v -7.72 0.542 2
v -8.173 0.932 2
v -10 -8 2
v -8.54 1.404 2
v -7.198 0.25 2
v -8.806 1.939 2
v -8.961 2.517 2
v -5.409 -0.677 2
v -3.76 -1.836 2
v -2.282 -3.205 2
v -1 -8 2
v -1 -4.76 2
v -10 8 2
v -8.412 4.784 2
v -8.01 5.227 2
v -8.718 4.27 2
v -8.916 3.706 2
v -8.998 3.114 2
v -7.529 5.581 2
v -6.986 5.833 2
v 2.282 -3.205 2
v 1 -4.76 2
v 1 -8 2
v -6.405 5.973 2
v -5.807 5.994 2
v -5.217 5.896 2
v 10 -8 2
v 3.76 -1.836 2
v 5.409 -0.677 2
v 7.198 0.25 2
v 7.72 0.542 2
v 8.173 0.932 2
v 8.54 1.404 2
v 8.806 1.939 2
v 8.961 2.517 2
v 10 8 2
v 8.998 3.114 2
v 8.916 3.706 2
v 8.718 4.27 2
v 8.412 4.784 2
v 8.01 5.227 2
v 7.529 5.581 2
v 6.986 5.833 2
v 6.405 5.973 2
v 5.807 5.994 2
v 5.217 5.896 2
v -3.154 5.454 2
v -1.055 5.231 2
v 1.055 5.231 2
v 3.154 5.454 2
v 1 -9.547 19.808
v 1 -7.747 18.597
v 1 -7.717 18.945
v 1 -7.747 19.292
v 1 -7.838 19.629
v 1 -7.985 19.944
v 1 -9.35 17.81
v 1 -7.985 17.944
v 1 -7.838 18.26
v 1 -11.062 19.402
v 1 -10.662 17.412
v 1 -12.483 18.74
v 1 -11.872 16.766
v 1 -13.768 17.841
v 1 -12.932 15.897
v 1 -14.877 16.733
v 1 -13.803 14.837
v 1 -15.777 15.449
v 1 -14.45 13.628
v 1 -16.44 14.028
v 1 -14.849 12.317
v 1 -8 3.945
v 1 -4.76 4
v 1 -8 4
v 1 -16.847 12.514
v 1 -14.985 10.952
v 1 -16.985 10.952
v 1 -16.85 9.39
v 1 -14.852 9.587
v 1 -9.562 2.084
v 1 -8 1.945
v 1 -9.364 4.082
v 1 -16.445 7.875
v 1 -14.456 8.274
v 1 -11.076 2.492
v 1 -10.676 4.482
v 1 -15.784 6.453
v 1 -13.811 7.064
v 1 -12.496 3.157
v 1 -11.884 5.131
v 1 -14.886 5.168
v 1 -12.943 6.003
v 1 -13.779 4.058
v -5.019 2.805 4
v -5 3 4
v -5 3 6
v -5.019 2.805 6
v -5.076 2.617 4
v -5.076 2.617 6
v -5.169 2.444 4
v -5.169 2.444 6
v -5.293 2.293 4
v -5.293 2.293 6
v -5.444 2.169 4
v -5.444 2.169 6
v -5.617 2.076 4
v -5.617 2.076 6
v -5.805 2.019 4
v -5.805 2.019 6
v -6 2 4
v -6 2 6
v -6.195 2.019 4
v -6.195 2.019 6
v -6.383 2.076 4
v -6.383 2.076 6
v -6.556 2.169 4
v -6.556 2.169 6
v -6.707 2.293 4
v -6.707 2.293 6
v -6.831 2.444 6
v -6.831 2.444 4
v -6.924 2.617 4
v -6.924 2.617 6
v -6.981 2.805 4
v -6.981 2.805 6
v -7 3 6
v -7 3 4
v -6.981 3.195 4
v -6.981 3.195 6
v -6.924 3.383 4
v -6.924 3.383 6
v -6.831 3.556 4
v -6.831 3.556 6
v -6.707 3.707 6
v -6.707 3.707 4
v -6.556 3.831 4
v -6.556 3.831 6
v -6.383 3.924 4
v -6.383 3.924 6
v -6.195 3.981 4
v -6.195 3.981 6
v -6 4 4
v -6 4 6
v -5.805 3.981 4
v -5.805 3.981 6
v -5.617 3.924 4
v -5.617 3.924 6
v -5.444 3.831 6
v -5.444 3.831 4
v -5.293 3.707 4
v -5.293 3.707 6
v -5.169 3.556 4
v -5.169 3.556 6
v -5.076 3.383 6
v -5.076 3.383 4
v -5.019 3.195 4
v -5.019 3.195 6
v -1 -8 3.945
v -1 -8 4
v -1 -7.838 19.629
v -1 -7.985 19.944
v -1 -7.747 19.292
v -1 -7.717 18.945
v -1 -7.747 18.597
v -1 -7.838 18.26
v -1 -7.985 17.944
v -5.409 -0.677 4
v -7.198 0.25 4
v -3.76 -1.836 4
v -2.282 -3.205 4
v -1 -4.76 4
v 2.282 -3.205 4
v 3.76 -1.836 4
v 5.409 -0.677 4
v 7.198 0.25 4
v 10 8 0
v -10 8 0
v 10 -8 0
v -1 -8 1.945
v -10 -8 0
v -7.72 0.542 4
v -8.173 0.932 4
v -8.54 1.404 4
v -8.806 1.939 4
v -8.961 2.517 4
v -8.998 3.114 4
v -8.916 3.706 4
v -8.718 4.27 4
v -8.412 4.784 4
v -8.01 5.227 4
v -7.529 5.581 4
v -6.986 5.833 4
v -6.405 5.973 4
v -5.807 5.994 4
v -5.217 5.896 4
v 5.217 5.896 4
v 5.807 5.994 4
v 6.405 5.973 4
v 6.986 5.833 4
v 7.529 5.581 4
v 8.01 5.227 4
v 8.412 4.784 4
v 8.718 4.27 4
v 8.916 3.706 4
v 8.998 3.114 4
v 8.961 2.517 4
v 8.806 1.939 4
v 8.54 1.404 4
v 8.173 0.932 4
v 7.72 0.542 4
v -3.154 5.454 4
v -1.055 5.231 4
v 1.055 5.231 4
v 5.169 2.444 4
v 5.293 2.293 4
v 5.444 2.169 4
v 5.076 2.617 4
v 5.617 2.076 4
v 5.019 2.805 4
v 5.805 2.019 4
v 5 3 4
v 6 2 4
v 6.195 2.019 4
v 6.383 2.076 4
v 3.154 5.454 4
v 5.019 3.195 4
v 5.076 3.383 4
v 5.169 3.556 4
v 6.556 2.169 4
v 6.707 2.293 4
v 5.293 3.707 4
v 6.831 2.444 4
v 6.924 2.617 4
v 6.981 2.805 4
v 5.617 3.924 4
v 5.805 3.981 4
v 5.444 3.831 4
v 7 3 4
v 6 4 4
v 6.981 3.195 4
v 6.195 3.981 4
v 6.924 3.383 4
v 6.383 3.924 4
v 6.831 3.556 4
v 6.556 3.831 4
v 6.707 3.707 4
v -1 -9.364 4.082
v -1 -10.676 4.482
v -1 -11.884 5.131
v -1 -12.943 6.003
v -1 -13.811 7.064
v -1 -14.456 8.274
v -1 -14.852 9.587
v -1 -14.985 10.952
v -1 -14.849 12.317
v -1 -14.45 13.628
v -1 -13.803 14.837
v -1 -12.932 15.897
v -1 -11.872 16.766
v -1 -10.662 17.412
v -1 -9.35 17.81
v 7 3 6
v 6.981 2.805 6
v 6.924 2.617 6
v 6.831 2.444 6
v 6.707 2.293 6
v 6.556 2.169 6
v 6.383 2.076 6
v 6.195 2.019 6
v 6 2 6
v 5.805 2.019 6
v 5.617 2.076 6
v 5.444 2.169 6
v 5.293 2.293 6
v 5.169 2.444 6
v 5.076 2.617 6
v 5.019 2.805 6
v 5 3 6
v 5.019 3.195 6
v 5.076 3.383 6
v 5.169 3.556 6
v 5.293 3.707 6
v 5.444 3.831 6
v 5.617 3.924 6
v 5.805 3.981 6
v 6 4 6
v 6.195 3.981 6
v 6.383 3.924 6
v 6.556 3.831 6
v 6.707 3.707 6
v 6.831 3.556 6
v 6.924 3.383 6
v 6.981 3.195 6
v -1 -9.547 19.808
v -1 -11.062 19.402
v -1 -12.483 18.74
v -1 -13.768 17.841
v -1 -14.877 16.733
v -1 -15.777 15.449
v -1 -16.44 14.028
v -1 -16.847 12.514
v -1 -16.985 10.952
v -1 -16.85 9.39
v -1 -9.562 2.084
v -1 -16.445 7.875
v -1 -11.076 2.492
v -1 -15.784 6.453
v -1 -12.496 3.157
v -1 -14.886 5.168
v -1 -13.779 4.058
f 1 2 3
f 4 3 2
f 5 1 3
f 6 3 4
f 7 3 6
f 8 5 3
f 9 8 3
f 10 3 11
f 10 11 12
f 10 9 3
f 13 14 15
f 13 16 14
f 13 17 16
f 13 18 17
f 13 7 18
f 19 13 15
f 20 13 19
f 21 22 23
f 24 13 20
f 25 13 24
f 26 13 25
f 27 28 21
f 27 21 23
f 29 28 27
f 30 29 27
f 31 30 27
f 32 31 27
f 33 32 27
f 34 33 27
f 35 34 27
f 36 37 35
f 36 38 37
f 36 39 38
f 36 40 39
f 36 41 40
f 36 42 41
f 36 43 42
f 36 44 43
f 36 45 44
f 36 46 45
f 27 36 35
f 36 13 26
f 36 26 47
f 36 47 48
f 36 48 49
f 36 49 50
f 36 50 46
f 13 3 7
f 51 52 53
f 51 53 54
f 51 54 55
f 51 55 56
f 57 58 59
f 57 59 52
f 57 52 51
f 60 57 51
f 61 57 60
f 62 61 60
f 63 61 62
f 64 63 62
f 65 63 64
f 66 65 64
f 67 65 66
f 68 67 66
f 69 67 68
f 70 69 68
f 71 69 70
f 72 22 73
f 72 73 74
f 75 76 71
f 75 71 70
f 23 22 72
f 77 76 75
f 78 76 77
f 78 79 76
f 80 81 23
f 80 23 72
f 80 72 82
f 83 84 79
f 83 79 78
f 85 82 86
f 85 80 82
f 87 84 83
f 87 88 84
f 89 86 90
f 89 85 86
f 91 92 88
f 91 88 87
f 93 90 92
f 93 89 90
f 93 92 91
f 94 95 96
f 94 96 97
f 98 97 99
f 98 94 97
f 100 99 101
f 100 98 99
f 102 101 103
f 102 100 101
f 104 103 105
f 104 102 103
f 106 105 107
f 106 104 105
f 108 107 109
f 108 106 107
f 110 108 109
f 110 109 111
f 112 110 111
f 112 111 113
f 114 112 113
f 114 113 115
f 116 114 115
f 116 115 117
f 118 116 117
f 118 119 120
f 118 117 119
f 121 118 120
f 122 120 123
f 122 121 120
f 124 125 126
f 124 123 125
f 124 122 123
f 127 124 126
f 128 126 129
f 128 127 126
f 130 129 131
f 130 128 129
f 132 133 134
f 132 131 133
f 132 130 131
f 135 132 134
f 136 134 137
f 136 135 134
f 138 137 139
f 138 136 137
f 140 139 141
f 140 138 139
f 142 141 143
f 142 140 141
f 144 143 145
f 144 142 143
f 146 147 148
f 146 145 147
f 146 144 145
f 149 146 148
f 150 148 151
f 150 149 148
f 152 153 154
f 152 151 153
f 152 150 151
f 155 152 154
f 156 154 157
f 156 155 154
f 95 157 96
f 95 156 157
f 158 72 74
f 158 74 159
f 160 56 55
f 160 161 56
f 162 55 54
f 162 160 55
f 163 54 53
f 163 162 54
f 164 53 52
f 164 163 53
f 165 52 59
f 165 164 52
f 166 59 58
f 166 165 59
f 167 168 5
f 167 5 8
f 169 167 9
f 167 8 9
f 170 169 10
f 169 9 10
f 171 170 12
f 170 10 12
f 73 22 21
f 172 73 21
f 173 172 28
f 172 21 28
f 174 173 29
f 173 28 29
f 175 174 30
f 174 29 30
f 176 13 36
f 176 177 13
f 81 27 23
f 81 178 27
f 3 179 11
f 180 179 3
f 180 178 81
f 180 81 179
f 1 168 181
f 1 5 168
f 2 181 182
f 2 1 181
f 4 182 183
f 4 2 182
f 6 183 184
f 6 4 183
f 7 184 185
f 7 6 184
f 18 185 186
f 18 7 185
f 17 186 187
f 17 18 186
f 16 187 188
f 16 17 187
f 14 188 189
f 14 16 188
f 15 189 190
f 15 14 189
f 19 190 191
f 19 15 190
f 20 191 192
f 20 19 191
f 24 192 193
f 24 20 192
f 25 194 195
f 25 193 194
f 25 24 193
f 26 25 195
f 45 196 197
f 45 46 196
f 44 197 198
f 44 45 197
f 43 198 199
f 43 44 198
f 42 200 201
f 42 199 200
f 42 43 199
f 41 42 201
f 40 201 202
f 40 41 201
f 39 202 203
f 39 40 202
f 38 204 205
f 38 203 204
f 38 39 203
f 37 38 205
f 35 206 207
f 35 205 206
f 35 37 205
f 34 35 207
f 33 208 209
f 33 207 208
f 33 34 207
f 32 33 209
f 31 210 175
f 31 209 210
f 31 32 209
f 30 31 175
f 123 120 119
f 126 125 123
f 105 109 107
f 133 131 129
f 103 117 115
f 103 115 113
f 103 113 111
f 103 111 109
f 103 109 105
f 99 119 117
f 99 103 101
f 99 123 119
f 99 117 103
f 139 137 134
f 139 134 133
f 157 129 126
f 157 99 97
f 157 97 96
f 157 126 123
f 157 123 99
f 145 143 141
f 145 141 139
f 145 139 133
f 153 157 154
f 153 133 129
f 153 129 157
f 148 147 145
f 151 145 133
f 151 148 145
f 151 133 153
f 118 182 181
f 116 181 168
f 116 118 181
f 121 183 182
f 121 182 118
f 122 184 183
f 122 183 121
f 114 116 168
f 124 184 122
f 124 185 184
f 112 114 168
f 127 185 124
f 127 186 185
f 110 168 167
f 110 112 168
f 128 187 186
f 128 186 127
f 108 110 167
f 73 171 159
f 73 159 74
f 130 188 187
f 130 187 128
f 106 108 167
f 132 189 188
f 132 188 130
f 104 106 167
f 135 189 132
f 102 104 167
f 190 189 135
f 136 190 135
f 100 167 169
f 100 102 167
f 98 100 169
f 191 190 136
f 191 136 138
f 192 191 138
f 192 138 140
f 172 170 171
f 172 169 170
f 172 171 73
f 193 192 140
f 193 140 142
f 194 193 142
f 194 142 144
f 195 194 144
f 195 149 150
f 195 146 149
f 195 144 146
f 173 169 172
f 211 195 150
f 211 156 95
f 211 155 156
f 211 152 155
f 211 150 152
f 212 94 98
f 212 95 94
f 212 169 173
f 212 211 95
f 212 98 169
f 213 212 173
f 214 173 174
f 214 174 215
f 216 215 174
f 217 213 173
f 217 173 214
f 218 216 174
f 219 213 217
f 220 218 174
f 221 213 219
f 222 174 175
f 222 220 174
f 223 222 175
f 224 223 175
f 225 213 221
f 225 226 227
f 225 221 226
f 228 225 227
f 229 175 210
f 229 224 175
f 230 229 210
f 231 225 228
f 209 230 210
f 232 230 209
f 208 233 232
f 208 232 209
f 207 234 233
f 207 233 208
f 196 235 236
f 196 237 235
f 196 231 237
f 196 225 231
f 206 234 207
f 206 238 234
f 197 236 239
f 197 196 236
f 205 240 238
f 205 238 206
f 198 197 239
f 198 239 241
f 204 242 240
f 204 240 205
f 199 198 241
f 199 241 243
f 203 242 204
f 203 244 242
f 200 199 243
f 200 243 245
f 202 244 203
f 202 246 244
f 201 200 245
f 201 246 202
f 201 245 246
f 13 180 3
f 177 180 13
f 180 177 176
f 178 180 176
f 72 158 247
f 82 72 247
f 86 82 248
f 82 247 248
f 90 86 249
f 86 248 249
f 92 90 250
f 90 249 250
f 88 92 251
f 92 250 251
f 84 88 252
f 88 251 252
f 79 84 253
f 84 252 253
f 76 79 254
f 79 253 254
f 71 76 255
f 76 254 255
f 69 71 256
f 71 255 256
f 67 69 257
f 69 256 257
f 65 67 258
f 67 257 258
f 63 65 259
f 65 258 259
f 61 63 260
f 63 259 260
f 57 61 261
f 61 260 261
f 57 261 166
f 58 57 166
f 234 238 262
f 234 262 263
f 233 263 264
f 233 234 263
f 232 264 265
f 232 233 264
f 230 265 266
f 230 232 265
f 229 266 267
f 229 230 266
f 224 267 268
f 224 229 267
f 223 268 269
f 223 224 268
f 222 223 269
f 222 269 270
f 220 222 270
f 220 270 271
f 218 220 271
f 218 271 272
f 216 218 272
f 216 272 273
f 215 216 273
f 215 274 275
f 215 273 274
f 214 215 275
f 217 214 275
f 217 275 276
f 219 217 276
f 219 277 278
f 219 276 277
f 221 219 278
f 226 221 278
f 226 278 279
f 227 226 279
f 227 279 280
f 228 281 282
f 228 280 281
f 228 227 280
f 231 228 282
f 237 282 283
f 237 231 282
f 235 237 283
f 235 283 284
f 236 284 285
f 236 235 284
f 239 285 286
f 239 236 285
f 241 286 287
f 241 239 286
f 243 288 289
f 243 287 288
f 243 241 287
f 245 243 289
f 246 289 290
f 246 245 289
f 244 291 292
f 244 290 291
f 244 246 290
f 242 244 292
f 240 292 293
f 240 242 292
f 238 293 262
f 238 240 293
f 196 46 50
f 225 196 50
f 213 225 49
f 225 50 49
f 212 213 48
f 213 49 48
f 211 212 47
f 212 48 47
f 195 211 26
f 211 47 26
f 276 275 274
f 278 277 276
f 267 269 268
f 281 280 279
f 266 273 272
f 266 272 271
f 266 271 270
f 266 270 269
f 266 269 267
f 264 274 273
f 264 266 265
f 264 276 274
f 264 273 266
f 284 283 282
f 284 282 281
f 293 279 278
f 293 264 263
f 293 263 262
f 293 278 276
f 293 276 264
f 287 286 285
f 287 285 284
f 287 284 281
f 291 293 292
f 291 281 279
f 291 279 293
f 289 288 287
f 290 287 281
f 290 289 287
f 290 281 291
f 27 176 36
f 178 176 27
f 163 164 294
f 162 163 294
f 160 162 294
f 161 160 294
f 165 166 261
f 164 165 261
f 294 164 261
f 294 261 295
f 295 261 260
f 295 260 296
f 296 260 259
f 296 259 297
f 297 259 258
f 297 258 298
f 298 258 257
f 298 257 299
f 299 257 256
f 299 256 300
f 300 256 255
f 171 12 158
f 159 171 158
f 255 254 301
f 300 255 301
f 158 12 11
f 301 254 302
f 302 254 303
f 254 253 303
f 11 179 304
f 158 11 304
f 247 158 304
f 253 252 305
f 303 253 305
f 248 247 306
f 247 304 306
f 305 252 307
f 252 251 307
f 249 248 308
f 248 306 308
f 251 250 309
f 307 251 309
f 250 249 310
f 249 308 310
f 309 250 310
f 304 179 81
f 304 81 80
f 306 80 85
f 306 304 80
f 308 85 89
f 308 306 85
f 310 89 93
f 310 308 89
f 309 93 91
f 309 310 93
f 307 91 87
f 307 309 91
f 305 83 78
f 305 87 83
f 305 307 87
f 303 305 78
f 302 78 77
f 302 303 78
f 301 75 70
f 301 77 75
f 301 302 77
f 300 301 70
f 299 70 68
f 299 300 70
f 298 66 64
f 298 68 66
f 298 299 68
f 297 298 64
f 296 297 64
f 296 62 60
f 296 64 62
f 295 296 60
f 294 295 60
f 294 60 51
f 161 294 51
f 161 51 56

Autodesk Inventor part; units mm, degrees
ref_plane "YZ Plane" through (0, 0, 0) normal (1, 0, 0) x (0, 1, 0)
ref_plane "XZ Plane" through (0, 0, 0) normal (0, 1, 0) x (-1, 0, 0)
ref_plane "XY Plane" through (0, 0, 0) normal (0, 0, 1) x (1, 0, 0)
sketch "Sketch1" plane through (0, 0, 0) normal (0, 0, 1) x (1, 0, 0)
  line L0 (-10, 8) -> (10, 8)
  line L1 (10, 8) -> (10, -8)
  line L2 (10, -8) -> (-10, -8)
  line L3 (-10, -8) -> (-10, 8)
  line L4 (-10, 8) -> (10, -8) construction
  line L5 (10, 8) -> (-10, -8) construction
  point P0 (0, 0)
  dimension "d0" = 20
  dimension "d1" = 16
extrude "Extrusion1" add sketch "Sketch1" along normal blind 2
sketch "Sketch2" plane through (0, 0, 2) normal (0, 0, 1) x (1, 0, 0)
  line L0 (10, 8) -> (-10, 8) projected
  line L1 (0, -0.2535) -> (0, 8)
  line L2 (0, 0) -> (0, -7.9613)
  line L3 (-10, -8) -> (10, -8) projected
  arc A0 (-5.2174, 5.8961) -> (-7.1982, 0.2497) centre (-6, 3) ccw
  arc A1 (7.1982, 0.2497) -> (5.2174, 5.8961) centre (6, 3) ccw
  arc A2 (-5.2174, 5.8961) -> (5.2174, 5.8961) centre (0, 25.2036) ccw
  line L4 (21.5208, 4.9837) -> (21.5208, 0.7791)
  line L5 (-1, -4.7601) -> (-1, -8)
  line L6 (1, -4.7601) -> (1, -8)
  arc A3 (-1, -4.7601) -> (-7.1982, 0.2497) centre (-13.1894, -13.5019) ccw
  arc A4 (7.1982, 0.2497) -> (1, -4.7601) centre (13.1894, -13.5019) ccw
  dimension "d8" = 16
  dimension "d14" = 15.5208
  dimension "d15" = 27.5208
  dimension "d16" = 1
  dimension "d18" = 15
extrude "Extrusion2" add sketch "Sketch2" along normal blind 2
sketch "Sketch3" plane through (0, 0, 4) normal (0, 0, 1) x (1, 0, 0)
  circle A0 centre (-6, 3) radius 1
  line L0 (10, 8) -> (-10, 8) projected
  circle A1 centre (6, 3) radius 1
  point P0 (0, 0)
  dimension "d21" = 2
  dimension "d22" = 5
extrude "Extrusion3" add sketch "Sketch3" along normal blind 2
sketch "Sketch4" plane through (0, 0, 0) normal (0, 1, 0) x (-1, 0, 0)
  point P0 (0, 0)
sketch "Sketch5" plane through (0, 0, 0) normal (1, 0, 0) x (0, 1, 0)
  point P0 (0, 0)
sketch "Sketch6" plane through (-10, -8, 0) normal (0, -1, 0) x (1, 0, 0)
  line L0 (9, 2) -> (9, 4) projected
  point P0 (10, 0)
sketch "Sketch7" plane through (-10, -8, 0) normal (0, -1, 0) x (1, 0, 0)
  point P0 (10, 0)
sketch "Sketch8" plane through (0, 0, 0) normal (1, 0, 0) x (0, 1, 0)
  point P0 (0, 0)
sketch "Sketch9" plane through (0, 0, 0) normal (0, 0, 1) x (1, 0, 0)
  point P0 (0, 0)
extrude "Extrusion4" [suppressed]
sketch "Sketch10" plane through (0, 0, 0) normal (0, 1, 0) x (-1, 0, 0)
  point P0 (0, 0)
sketch "Sketch11" plane through (0, 0, 0) normal (0, 1, 0) x (-1, 0, 0)
  point P0 (0, 0)
extrude "Extrusion5" [suppressed]
sketch "Sketch12" plane through (0, 0, 0) normal (1, 0, 0) x (0, 1, 0)
  point P0 (0, 0)
sketch "Sketch13" plane through (0, 0, 0) normal (0, 1, 0) x (-1, 0, 0)
  line L0 (1, 2) -> (1, 4) projected
  point P0 (0, 0)
sketch "Sketch14" plane through (0, 0, 0) normal (0, 1, 0) x (-1, 0, 0)
  point P0 (0, 0)
extrude "Extrusion6" [suppressed]
sketch "Sketch15" plane through (0, 0, 0) normal (1, 0, 0) x (0, 1, 0)
  arc A0 (-7.985, 19.9445) -> (-7.985, 1.9445) centre (-7.985, 10.9445) ccw
  arc A1 (-7.985, 17.9445) -> (-7.985, 3.9445) centre (-7.985, 10.9445) ccw
  line L0 (-7.985, 1.9445) -> (-7.985, 3.9445)
  arc A2 (-7.985, 17.9445) -> (-7.985, 19.9445) centre (-9.717, 18.9445) ccw
  point P0 (0, 0)
  dimension "d44" = 2
extrude "Extrusion7" add sketch "Sketch15" along normal mid plane 2
properties part number "cad@25"
